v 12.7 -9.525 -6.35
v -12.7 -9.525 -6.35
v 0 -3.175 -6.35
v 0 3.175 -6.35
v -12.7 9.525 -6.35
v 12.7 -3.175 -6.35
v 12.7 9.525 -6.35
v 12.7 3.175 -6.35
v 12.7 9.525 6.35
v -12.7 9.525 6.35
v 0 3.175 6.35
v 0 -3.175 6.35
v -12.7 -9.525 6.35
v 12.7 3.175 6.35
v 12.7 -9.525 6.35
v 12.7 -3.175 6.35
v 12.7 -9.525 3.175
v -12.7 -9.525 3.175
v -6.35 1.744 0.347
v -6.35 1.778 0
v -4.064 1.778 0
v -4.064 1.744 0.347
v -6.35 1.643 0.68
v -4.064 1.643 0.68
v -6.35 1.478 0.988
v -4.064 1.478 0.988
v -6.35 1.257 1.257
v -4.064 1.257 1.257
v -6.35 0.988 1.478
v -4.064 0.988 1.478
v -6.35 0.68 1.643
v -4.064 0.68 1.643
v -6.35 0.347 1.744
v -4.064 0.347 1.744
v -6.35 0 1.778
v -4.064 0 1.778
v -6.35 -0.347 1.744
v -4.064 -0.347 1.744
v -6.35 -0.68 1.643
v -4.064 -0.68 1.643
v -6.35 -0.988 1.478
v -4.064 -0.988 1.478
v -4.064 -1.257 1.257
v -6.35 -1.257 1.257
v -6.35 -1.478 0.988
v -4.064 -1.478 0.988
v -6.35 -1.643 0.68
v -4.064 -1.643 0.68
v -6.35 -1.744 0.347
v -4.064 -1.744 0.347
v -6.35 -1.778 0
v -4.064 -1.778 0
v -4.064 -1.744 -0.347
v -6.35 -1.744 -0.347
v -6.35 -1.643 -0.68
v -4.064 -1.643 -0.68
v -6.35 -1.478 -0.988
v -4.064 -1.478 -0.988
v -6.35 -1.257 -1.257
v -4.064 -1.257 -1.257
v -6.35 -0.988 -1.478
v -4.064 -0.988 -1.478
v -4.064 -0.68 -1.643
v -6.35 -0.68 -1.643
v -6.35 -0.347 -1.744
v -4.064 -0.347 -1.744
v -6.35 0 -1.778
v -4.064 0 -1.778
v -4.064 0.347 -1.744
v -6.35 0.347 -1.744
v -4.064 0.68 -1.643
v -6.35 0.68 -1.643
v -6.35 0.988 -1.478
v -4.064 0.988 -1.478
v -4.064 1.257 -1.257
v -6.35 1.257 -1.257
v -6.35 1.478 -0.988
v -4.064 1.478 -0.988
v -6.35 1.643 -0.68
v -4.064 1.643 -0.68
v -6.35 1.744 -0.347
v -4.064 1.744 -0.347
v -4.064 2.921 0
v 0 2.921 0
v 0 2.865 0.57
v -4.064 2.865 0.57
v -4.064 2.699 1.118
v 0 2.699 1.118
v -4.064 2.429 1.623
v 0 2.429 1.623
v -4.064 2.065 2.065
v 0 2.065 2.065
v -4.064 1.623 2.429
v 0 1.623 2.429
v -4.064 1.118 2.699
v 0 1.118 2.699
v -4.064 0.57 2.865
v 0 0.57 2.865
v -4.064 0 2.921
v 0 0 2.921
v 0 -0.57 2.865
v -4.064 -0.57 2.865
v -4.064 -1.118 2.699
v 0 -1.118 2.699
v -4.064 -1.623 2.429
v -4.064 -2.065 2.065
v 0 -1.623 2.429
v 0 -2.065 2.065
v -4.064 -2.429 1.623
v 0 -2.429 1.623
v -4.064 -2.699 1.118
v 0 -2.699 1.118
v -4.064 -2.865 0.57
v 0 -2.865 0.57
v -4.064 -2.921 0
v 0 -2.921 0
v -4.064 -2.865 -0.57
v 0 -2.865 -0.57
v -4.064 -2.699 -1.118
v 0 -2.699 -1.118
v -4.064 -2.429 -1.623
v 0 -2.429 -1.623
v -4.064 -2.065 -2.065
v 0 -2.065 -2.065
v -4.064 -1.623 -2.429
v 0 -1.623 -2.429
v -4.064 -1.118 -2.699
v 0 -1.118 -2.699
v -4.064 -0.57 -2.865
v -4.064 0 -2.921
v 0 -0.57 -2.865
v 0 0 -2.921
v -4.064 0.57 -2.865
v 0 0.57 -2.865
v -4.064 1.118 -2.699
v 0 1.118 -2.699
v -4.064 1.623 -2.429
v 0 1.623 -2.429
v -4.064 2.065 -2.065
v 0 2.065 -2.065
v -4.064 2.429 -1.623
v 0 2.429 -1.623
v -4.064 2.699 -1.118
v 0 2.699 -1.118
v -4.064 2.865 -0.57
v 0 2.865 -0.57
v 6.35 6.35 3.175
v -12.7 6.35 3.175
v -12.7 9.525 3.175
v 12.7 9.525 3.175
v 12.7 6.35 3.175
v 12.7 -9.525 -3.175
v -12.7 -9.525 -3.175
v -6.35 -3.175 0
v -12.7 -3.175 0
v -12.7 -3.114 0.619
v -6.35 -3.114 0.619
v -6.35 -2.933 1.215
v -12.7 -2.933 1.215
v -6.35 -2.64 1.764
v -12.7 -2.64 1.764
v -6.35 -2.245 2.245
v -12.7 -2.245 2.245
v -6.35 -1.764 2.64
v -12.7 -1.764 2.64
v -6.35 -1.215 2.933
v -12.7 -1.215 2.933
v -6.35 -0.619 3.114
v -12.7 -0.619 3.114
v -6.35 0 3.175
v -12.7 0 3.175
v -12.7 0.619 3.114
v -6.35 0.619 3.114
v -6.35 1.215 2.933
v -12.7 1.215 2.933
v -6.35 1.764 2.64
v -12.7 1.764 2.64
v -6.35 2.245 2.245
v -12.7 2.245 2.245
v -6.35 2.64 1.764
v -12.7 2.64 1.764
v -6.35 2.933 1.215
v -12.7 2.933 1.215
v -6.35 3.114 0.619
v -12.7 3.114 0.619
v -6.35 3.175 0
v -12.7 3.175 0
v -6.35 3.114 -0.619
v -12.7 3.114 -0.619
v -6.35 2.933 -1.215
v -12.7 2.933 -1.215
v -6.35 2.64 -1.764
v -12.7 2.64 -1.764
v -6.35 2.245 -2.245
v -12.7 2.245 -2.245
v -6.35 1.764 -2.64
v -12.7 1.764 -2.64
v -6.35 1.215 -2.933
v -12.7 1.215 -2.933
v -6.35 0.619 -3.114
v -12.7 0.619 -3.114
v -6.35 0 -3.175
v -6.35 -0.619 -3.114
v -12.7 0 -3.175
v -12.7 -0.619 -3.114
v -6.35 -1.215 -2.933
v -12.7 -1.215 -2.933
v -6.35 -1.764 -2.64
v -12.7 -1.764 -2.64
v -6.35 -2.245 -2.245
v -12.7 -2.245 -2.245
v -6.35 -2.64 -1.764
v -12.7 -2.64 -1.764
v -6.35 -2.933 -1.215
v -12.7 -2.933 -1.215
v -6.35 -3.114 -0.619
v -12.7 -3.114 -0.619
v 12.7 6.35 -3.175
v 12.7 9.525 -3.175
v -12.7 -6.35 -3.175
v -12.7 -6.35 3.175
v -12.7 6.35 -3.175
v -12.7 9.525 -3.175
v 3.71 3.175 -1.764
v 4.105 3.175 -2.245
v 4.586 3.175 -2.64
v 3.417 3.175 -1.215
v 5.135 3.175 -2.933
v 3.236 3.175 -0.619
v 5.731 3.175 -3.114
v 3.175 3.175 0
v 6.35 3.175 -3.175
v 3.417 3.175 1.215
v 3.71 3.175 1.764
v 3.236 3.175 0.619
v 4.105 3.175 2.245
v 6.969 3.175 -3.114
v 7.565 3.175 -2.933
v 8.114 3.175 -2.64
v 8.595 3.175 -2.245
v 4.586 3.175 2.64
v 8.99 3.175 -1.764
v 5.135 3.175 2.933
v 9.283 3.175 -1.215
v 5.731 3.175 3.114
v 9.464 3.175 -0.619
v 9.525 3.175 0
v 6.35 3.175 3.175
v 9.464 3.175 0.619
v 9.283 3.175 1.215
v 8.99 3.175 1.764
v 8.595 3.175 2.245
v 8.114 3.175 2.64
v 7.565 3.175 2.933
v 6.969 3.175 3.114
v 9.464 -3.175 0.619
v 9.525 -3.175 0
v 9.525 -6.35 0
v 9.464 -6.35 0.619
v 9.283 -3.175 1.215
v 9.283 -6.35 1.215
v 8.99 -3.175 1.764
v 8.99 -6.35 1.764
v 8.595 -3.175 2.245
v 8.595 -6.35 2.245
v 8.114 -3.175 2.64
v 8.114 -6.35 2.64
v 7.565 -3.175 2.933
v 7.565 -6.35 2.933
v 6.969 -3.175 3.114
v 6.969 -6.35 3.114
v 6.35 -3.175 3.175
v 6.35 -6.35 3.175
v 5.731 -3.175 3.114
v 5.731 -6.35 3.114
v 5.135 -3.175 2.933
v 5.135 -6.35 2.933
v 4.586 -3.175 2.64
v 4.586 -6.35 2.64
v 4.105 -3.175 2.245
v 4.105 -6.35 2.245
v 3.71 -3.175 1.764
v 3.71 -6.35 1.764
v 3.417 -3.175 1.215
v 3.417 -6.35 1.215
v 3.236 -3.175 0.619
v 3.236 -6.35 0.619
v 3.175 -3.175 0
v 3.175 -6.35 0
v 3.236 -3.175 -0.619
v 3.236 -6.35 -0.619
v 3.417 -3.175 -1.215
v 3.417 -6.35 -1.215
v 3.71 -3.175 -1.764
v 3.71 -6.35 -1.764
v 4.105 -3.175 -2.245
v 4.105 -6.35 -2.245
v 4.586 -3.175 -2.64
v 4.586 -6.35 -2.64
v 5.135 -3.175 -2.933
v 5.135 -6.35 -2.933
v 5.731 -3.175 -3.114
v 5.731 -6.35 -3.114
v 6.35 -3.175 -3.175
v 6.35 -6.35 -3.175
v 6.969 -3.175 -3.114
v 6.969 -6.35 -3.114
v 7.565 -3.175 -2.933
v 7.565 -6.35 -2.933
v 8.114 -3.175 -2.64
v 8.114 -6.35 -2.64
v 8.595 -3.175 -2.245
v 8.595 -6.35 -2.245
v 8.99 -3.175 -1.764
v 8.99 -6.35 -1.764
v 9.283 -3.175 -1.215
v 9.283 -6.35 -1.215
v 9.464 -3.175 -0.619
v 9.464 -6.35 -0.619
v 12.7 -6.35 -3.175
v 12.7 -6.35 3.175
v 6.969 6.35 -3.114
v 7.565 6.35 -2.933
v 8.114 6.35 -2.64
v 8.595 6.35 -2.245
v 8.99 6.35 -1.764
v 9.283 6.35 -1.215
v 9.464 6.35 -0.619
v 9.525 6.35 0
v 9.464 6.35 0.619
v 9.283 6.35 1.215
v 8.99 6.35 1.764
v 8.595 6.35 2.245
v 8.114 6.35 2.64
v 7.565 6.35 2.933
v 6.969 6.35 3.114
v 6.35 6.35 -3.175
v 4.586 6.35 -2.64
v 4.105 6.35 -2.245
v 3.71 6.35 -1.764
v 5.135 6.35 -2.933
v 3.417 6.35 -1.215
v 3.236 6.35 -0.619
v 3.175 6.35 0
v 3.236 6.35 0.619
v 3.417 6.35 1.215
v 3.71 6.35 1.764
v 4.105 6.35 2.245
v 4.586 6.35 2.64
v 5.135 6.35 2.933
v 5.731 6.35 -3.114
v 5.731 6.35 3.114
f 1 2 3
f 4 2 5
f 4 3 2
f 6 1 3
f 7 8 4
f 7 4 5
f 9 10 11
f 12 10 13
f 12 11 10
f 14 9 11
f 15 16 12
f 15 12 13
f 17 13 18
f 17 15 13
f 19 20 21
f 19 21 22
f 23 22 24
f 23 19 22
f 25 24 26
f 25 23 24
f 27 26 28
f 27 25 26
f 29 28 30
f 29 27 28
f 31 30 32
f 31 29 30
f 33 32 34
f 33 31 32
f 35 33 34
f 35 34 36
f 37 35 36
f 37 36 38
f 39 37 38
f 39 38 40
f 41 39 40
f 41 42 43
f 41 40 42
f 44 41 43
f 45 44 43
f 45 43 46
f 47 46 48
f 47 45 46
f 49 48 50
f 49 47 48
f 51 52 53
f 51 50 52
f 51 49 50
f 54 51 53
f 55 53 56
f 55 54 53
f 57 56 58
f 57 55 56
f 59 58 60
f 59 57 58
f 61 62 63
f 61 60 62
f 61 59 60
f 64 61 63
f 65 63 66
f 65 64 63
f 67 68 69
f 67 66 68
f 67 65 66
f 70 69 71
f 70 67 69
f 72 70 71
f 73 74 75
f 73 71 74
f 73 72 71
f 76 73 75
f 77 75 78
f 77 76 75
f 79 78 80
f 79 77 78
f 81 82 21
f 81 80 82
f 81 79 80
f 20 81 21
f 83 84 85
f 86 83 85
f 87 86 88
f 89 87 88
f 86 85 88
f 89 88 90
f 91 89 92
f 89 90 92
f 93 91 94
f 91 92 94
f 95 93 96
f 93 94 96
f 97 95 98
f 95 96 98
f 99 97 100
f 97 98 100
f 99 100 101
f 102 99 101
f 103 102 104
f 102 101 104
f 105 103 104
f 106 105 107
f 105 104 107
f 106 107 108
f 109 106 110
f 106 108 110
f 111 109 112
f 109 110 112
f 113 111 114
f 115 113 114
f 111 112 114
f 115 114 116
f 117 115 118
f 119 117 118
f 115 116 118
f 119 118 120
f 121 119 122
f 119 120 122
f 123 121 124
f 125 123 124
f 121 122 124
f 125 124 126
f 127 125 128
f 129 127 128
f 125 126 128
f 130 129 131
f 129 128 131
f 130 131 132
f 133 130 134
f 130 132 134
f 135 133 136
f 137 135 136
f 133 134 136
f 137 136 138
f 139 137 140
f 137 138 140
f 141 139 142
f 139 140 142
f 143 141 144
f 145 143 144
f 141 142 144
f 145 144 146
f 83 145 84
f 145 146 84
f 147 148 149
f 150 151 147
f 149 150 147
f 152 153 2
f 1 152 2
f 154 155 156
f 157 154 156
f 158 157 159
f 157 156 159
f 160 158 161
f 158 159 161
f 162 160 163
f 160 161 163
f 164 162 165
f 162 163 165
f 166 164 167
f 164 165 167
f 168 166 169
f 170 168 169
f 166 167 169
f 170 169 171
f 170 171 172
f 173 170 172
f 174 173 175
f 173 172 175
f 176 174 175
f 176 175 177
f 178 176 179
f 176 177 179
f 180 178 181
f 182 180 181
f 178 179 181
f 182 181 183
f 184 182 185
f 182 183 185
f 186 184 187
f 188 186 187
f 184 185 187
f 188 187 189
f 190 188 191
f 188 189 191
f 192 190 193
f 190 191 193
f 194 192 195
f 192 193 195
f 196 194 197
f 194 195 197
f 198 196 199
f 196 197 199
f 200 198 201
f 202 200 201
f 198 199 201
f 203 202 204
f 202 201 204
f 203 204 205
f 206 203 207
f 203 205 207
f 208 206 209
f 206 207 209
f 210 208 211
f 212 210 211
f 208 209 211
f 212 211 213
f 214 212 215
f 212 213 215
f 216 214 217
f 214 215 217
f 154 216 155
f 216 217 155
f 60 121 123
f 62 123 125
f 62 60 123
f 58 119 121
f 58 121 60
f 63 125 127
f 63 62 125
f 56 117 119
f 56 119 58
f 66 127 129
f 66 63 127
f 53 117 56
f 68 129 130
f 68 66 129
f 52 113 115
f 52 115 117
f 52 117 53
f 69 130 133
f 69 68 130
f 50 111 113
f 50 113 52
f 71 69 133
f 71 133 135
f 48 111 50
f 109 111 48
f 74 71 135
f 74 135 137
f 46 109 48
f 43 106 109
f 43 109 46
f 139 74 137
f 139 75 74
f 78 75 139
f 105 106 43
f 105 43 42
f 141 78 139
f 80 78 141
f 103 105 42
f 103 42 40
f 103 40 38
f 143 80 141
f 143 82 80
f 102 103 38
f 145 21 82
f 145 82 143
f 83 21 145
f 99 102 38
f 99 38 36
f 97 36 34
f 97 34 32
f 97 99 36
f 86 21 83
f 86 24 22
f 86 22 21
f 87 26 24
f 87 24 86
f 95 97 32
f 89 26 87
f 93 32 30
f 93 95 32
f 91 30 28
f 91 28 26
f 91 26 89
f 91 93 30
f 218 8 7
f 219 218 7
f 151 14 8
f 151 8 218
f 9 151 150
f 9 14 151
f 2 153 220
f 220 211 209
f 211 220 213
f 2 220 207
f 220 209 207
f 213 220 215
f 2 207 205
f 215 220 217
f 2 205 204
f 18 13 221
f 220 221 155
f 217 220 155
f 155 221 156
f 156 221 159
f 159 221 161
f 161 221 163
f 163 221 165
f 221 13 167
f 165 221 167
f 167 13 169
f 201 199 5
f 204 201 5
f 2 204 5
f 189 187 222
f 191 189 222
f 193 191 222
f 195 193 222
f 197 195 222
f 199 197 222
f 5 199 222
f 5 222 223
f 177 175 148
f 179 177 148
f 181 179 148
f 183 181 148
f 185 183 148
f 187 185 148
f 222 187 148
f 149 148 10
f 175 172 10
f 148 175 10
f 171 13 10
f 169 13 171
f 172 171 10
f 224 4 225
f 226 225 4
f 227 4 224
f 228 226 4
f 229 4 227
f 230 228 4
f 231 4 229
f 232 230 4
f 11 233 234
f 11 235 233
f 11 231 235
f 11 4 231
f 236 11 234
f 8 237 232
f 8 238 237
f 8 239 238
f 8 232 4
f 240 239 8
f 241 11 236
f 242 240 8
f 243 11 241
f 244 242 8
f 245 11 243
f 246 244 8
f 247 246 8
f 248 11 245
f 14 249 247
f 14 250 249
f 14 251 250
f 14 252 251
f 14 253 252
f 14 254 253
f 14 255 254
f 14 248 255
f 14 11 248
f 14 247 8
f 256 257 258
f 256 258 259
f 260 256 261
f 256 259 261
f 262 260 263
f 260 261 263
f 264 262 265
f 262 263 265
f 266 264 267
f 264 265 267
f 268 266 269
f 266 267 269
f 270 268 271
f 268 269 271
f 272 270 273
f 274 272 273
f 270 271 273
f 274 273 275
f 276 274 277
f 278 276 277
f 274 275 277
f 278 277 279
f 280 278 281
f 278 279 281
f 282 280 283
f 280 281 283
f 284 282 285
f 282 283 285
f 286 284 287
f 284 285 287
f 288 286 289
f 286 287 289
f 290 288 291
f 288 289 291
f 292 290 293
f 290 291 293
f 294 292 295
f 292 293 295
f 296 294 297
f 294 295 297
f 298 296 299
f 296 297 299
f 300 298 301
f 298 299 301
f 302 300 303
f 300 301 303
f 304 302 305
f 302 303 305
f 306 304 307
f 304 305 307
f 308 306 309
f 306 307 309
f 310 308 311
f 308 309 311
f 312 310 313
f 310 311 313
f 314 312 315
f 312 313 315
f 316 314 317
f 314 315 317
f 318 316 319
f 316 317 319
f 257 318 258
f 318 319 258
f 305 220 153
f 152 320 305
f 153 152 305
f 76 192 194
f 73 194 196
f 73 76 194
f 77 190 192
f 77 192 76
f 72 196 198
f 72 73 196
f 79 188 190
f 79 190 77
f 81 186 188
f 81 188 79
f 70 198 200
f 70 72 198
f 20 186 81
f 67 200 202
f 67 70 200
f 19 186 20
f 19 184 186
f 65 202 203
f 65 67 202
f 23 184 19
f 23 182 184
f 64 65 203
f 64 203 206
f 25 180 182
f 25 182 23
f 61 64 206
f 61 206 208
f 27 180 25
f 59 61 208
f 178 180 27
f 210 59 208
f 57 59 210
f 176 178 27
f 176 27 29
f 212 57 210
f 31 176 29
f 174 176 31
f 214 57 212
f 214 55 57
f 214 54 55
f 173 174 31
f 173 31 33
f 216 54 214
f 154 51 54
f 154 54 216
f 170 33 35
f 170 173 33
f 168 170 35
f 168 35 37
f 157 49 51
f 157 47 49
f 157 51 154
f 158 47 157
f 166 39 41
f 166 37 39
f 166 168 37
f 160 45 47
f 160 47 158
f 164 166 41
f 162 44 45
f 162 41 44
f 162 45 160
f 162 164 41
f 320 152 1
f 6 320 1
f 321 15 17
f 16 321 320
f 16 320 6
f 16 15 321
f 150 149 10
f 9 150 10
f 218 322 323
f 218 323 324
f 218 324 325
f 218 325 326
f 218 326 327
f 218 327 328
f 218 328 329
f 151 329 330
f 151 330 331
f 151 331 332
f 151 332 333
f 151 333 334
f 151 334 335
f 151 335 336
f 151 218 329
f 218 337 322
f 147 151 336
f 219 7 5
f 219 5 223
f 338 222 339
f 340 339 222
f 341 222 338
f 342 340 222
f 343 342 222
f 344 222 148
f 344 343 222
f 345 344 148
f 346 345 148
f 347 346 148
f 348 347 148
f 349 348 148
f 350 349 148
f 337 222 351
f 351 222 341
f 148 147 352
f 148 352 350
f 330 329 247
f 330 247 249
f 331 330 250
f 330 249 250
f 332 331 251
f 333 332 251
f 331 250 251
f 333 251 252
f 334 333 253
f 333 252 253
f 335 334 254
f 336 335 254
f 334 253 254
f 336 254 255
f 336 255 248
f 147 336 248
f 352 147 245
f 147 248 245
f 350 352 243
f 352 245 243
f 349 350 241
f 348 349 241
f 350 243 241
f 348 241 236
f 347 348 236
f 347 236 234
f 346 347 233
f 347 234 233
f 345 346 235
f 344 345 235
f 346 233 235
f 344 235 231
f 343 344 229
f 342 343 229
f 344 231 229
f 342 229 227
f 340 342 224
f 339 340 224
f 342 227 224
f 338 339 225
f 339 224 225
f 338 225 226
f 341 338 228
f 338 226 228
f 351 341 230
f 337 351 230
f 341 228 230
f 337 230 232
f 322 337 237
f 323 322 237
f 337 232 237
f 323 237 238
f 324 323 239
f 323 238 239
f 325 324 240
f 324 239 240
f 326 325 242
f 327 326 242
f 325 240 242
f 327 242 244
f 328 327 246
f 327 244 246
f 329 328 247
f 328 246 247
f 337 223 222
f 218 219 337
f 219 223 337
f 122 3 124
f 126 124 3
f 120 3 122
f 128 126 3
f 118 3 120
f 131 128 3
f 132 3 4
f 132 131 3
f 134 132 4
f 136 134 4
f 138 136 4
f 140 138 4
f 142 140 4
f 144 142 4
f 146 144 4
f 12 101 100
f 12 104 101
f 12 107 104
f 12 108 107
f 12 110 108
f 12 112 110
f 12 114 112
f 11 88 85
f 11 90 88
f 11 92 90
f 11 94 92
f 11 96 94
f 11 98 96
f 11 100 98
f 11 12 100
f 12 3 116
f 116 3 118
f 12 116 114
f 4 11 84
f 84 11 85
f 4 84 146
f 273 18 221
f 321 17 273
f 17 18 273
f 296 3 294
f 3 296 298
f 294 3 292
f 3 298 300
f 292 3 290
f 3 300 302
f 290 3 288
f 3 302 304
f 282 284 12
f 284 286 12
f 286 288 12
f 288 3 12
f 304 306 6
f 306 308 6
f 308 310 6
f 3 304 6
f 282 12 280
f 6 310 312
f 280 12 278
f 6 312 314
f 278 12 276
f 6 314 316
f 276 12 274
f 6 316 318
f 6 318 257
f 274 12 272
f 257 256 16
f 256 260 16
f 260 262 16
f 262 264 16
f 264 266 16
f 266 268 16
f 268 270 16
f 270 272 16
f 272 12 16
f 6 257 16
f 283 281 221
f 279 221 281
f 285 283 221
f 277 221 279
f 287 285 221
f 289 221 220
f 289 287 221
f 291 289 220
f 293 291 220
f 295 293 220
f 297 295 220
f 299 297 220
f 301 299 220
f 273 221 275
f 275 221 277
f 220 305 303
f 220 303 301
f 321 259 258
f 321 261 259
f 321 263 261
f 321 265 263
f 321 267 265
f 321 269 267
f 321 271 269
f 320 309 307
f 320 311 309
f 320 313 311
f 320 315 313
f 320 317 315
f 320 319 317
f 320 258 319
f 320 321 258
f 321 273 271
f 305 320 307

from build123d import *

# Parameters (mm, degrees)
F0_R     = 1.778
F1_DEPTH = 12.7
F2_R     = 3.175
F3_DEPTH = 12.7
F4_W     = 12.7
F4_H     = 6.35
F5_DEPTH = 12.7
F6_R     = 2.921
F7_DEPTH = 4.064
F8_R     = 3.175
F9_DEPTH = 6.35


with BuildPart() as f1:
    # F0 (on Right) → F1 (new body, symmetric)
    with BuildSketch(Plane.YZ):
        Polygon((-6.35, 3.175), (-6.35, -3.175), (-9.525, -3.175), (-9.525, -6.35), (9.525, -6.35), (9.525, -3.175), (6.35, -3.175), (6.35, 3.175), (9.525, 3.175), (9.525, 6.35), (-9.525, 6.35), (-9.525, 3.175), align=None)
        Circle(F0_R, mode=Mode.SUBTRACT)
    extrude(amount=F1_DEPTH, both=True)

    # F2 (on Front) → F3 (cut, symmetric)
    with BuildSketch(Plane.XZ):
        with Locations((6.35, 0)):
            Circle(F2_R)
    extrude(amount=F3_DEPTH, both=True, mode=Mode.SUBTRACT)

    # F4 (on Top) → F5 (cut, symmetric)
    with BuildSketch(Plane.XY):
        with Locations((6.35, 0)):
            Rectangle(F4_W, F4_H)
    extrude(amount=F5_DEPTH, both=True, mode=Mode.SUBTRACT)

    # F6 (on face) → F7 (cut)
    with BuildSketch(Plane.YZ):
        Circle(F6_R)
    extrude(amount=-F7_DEPTH, mode=Mode.SUBTRACT)

    # F8 (on face) → F9 (cut)
    with BuildSketch(Plane(origin=(-12.7, 0, 0), x_dir=(0, -1, 0), z_dir=(-1, 0, 0))):
        Circle(F8_R)
    extrude(amount=-F9_DEPTH, mode=Mode.SUBTRACT)


solid = f1.part
